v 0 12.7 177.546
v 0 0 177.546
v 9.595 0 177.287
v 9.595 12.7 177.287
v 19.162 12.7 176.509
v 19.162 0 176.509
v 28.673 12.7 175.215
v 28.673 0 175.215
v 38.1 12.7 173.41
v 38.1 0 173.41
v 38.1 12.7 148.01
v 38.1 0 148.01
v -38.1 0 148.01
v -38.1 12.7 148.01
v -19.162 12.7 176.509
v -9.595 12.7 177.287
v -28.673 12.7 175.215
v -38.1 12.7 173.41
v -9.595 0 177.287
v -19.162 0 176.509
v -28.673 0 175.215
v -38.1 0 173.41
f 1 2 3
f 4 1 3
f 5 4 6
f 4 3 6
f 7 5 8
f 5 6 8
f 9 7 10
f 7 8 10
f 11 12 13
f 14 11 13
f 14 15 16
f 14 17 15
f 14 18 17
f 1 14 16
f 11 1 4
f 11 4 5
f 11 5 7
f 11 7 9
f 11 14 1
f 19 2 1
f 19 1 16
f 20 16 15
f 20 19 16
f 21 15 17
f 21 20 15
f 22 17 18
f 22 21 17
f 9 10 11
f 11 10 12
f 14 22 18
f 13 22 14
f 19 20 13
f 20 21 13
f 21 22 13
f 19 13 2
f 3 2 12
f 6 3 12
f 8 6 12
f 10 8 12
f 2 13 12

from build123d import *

# Parameters (mm, degrees)
BOSS_EXTRUDE1_DEPTH = 12.7


with BuildPart() as part:
    # Sketch1 → Boss-Extrude1 (new body)
    with BuildSketch(Plane(origin=(0, 0, 0), x_dir=(1, 0, 0), z_dir=(0, 1, 0))):
        with BuildLine():
            Line((-38.1, -173.409838579), (-38.1, -148.009838579))
            Line((-38.1, -148.009838579), (0, -148.009838579))
            Line((0, -148.009838579), (0, -177.546))
            ThreePointArc((0, -177.546), (-19.161927299, -176.508930817), (-38.1, -173.409838579))
        make_face()
    boss_extrude1 = extrude(amount=BOSS_EXTRUDE1_DEPTH)

    # Mirror1: Boss-Extrude1 across plane
    add(boss_extrude1.mirror(Plane(origin=(0, 12.7, 148.009838579), x_dir=(0, 0, 1), z_dir=(-1, 0, 0))))


solid = part.part
